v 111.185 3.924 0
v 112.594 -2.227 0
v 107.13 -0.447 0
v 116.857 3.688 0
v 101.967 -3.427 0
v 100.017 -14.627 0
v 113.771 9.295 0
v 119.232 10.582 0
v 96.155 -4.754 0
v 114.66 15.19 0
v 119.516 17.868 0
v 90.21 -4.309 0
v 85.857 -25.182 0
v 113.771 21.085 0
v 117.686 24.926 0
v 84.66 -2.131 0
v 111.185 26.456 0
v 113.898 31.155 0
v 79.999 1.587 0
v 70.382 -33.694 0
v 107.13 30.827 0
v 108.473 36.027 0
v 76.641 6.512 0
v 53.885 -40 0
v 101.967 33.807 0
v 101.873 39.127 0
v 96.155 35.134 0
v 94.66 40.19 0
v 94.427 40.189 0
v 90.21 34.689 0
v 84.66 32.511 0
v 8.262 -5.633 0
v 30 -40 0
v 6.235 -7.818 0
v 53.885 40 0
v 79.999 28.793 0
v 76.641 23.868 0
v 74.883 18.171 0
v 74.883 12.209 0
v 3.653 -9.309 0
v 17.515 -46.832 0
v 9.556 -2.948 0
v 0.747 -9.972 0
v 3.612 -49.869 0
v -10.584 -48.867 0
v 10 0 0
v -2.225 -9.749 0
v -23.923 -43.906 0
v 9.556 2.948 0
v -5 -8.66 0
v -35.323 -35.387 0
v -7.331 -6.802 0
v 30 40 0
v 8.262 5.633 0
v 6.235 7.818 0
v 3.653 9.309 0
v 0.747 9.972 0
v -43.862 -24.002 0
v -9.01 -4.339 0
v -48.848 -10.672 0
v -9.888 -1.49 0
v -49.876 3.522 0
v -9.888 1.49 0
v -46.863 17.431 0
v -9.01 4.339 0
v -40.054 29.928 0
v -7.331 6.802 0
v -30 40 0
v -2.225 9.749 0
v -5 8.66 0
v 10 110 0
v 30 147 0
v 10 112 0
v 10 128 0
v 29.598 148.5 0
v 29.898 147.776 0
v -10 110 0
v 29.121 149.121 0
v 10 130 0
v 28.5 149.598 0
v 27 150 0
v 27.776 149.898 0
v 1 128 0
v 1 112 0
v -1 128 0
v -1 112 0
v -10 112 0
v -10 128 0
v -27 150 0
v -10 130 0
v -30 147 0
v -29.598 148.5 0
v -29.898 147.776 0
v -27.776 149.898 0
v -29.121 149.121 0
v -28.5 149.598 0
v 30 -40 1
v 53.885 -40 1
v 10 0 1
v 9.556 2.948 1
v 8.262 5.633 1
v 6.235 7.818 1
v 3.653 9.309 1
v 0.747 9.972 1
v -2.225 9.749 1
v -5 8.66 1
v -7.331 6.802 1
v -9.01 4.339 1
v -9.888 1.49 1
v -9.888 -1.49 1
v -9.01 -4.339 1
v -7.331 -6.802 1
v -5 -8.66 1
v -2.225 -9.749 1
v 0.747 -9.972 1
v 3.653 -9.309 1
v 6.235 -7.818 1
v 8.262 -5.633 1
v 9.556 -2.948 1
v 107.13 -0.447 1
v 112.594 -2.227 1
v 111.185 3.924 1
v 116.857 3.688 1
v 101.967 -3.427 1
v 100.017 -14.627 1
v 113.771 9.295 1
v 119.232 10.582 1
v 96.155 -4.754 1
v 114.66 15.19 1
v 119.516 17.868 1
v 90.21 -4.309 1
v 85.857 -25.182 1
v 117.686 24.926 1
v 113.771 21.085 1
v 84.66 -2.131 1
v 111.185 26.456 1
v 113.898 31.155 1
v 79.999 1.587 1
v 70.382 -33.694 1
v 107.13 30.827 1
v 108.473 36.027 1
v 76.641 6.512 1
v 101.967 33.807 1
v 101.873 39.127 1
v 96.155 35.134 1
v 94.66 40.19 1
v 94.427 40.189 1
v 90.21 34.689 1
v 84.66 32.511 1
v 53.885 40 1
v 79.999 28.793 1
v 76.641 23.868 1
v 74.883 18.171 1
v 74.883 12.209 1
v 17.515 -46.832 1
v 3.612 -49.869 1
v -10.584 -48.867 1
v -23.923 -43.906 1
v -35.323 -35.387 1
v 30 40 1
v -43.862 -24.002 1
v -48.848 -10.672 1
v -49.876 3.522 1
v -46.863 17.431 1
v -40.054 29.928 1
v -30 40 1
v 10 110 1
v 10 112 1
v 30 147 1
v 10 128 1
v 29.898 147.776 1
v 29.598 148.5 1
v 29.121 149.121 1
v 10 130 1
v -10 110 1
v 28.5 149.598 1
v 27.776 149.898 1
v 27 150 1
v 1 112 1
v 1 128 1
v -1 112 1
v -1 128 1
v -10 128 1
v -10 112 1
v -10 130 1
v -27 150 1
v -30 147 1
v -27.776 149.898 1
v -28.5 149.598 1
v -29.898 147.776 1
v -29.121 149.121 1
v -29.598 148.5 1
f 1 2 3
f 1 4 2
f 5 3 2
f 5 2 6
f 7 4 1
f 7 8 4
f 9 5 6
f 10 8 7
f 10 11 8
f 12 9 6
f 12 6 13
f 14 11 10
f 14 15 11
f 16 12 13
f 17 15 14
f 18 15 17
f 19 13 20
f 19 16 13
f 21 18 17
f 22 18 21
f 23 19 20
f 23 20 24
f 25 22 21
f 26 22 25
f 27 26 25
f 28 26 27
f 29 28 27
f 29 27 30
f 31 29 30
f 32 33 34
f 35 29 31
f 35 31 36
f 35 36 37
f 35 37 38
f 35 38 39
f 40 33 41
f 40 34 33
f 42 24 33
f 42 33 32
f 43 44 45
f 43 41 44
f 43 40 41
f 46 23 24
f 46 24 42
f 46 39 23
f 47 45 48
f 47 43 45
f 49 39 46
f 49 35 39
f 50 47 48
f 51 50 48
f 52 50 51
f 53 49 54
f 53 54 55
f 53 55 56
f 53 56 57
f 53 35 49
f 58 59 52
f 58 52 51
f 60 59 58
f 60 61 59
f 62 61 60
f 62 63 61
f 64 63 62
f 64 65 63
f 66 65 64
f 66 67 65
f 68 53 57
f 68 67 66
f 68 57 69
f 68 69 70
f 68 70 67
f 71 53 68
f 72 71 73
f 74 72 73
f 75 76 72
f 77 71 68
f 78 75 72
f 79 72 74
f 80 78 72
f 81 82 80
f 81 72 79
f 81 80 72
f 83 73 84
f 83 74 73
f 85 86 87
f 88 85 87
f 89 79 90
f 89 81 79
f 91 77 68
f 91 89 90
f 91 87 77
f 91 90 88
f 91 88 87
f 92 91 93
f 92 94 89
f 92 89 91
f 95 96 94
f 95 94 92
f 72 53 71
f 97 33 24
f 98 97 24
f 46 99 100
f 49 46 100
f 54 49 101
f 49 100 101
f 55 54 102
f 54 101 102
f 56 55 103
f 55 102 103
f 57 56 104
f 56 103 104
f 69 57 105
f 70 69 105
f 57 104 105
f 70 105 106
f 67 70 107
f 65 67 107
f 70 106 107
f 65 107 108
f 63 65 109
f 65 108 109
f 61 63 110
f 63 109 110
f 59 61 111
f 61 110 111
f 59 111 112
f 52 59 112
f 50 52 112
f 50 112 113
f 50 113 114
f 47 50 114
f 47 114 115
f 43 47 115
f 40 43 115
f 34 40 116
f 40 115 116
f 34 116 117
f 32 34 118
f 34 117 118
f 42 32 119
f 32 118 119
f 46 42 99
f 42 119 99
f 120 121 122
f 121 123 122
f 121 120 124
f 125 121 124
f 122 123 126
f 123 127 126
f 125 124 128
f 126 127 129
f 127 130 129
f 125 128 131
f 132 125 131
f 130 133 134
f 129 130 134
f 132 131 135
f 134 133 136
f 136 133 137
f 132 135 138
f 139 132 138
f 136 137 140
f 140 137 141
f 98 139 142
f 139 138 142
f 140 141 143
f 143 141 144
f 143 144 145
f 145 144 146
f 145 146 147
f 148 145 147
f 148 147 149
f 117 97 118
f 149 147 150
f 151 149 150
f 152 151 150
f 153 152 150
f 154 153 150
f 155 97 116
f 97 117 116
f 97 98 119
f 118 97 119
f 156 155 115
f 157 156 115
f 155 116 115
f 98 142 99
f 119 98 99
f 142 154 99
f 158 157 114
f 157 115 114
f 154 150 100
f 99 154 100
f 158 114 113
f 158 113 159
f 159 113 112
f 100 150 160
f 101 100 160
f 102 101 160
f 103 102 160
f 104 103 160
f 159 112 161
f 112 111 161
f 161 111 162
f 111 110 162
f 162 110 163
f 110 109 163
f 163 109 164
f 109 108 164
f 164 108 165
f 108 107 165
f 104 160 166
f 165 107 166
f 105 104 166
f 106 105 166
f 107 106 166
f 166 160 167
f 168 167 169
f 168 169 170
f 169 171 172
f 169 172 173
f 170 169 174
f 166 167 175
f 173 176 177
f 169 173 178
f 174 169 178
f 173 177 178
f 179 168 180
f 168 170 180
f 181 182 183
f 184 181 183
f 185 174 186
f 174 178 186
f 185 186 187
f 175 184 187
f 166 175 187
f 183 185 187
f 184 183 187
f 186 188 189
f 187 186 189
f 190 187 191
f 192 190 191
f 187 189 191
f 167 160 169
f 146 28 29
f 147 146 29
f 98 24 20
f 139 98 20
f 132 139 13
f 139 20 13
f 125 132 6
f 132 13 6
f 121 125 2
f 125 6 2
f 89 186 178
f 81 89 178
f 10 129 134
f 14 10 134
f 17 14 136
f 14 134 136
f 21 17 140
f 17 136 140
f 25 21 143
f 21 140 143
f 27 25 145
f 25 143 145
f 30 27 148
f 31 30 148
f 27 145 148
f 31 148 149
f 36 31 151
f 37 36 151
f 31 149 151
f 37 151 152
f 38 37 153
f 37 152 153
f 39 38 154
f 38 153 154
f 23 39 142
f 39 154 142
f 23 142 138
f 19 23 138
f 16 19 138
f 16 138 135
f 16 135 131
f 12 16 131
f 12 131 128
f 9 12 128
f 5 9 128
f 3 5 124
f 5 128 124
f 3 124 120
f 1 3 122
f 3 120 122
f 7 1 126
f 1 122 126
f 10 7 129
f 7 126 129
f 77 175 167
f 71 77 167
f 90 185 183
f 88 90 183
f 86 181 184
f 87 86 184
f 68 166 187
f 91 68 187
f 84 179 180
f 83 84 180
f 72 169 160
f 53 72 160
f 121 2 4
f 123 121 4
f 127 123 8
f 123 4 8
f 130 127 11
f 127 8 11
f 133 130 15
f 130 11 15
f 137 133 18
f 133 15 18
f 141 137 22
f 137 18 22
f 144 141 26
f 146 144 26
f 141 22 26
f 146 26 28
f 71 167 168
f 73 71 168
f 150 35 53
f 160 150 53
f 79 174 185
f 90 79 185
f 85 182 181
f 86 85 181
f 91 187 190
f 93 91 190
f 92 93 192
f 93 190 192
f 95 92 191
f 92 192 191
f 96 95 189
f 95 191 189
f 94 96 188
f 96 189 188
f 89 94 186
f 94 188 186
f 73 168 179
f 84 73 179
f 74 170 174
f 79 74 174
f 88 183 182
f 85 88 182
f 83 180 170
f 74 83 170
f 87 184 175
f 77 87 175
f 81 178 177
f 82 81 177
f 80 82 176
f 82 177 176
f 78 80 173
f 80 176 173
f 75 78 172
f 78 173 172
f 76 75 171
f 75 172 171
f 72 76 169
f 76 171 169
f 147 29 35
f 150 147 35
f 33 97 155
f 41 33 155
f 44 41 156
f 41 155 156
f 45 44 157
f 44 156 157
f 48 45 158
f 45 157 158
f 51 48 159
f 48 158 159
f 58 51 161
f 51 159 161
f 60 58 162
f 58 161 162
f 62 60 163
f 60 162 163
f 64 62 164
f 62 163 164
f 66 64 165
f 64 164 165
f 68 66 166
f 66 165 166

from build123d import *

# Parameters (mm, degrees)
SKETCH1_R           = 10
BOSS_EXTRUDE1_DEPTH = 1
SKETCH2_R           = 10
CUT_EXTRUDE1_DEPTH  = 1
SKETCH3_R           = 20
CUT_EXTRUDE2_DEPTH  = 1
CUT_EXTRUDE3_DEPTH  = 127.23292637
BOSS_EXTRUDE2_DEPTH = 1
BOSS_EXTRUDE4_DEPTH = 1


with BuildPart() as part:
    # Sketch1 → Boss-Extrude1 (new body)
    with BuildSketch(Plane.XY):
        with BuildLine():
            Line((94.42701916, 40.188914375), (53.885, 40))
            Line((53.885, 40), (-53.885, 40))
            Line((-53.885, 40), (-53.885, -40))
            Line((-53.885, -40), (53.885, -40))
            ThreePointArc((53.885, -40), (85.857258243, -25.182373866), (112.594107484, -2.227456438))
            ThreePointArc((112.594107484, -2.227456438), (117.686467499, 24.925594205), (94.66, 40.19))
            Line((94.66, 40.19), (94.42701916, 40.188914375))
        make_face()
        with Locations((91.76, 19.26)):
            Circle(SKETCH1_R, mode=Mode.SUBTRACT)
    extrude(amount=BOSS_EXTRUDE1_DEPTH)

    # Sketch2 → Cut-Extrude1 (cut)
    with BuildSketch(Plane.XY.offset(1)):
        Circle(SKETCH2_R)
    extrude(amount=-CUT_EXTRUDE1_DEPTH, mode=Mode.SUBTRACT)

    # Sketch3 → Cut-Extrude2 (cut)
    with BuildSketch(Plane.XY.offset(1)):
        with Locations((94.66, 15.19)):
            Circle(SKETCH3_R)
    extrude(amount=-CUT_EXTRUDE2_DEPTH, mode=Mode.SUBTRACT)

    # Sketch4 → Cut-Extrude3 (cut, through all)
    with BuildSketch(Plane.XY.offset(1)):
        with BuildLine():
            Line((-53.885, 40), (-30, 40))
            ThreePointArc((-30, 40), (-50, 0), (-30, -40))
            Line((-30, -40), (-53.885, -40))
            Line((-53.885, -40), (-53.885, 40))
        make_face()
    extrude(amount=-CUT_EXTRUDE3_DEPTH, mode=Mode.SUBTRACT)

    # Sketch5 → Boss-Extrude2 (add)
    with BuildSketch(Plane.XY.offset(1)):
        with BuildLine():
            Line((-30, -40), (30, -40))
            ThreePointArc((30, -40), (0, -50), (-30, -40))
        make_face()
    extrude(amount=-BOSS_EXTRUDE2_DEPTH)

    # Sketch6 → Boss-Extrude4 (add)
    with BuildSketch(Plane.XY.offset(1)):
        with BuildLine():
            Line((-30, 40), (-30, 147))
            ThreePointArc((-30, 147), (-29.121320344, 149.121320344), (-27, 150))
            Line((-27, 150), (27, 150))
            ThreePointArc((27, 150), (29.121320344, 149.121320344), (30, 147))
            Line((30, 147), (30, 40))
            Line((30, 40), (-30, 40))
        make_face()
        Polygon((-1, 128), (-1, 112), (-10, 112), (-10, 110), (10, 110), (10, 112), (1, 112), (1, 128), (10, 128), (10, 130), (-10, 130), (-10, 128), align=None, mode=Mode.SUBTRACT)
    extrude(amount=-BOSS_EXTRUDE4_DEPTH)


solid = part.part
